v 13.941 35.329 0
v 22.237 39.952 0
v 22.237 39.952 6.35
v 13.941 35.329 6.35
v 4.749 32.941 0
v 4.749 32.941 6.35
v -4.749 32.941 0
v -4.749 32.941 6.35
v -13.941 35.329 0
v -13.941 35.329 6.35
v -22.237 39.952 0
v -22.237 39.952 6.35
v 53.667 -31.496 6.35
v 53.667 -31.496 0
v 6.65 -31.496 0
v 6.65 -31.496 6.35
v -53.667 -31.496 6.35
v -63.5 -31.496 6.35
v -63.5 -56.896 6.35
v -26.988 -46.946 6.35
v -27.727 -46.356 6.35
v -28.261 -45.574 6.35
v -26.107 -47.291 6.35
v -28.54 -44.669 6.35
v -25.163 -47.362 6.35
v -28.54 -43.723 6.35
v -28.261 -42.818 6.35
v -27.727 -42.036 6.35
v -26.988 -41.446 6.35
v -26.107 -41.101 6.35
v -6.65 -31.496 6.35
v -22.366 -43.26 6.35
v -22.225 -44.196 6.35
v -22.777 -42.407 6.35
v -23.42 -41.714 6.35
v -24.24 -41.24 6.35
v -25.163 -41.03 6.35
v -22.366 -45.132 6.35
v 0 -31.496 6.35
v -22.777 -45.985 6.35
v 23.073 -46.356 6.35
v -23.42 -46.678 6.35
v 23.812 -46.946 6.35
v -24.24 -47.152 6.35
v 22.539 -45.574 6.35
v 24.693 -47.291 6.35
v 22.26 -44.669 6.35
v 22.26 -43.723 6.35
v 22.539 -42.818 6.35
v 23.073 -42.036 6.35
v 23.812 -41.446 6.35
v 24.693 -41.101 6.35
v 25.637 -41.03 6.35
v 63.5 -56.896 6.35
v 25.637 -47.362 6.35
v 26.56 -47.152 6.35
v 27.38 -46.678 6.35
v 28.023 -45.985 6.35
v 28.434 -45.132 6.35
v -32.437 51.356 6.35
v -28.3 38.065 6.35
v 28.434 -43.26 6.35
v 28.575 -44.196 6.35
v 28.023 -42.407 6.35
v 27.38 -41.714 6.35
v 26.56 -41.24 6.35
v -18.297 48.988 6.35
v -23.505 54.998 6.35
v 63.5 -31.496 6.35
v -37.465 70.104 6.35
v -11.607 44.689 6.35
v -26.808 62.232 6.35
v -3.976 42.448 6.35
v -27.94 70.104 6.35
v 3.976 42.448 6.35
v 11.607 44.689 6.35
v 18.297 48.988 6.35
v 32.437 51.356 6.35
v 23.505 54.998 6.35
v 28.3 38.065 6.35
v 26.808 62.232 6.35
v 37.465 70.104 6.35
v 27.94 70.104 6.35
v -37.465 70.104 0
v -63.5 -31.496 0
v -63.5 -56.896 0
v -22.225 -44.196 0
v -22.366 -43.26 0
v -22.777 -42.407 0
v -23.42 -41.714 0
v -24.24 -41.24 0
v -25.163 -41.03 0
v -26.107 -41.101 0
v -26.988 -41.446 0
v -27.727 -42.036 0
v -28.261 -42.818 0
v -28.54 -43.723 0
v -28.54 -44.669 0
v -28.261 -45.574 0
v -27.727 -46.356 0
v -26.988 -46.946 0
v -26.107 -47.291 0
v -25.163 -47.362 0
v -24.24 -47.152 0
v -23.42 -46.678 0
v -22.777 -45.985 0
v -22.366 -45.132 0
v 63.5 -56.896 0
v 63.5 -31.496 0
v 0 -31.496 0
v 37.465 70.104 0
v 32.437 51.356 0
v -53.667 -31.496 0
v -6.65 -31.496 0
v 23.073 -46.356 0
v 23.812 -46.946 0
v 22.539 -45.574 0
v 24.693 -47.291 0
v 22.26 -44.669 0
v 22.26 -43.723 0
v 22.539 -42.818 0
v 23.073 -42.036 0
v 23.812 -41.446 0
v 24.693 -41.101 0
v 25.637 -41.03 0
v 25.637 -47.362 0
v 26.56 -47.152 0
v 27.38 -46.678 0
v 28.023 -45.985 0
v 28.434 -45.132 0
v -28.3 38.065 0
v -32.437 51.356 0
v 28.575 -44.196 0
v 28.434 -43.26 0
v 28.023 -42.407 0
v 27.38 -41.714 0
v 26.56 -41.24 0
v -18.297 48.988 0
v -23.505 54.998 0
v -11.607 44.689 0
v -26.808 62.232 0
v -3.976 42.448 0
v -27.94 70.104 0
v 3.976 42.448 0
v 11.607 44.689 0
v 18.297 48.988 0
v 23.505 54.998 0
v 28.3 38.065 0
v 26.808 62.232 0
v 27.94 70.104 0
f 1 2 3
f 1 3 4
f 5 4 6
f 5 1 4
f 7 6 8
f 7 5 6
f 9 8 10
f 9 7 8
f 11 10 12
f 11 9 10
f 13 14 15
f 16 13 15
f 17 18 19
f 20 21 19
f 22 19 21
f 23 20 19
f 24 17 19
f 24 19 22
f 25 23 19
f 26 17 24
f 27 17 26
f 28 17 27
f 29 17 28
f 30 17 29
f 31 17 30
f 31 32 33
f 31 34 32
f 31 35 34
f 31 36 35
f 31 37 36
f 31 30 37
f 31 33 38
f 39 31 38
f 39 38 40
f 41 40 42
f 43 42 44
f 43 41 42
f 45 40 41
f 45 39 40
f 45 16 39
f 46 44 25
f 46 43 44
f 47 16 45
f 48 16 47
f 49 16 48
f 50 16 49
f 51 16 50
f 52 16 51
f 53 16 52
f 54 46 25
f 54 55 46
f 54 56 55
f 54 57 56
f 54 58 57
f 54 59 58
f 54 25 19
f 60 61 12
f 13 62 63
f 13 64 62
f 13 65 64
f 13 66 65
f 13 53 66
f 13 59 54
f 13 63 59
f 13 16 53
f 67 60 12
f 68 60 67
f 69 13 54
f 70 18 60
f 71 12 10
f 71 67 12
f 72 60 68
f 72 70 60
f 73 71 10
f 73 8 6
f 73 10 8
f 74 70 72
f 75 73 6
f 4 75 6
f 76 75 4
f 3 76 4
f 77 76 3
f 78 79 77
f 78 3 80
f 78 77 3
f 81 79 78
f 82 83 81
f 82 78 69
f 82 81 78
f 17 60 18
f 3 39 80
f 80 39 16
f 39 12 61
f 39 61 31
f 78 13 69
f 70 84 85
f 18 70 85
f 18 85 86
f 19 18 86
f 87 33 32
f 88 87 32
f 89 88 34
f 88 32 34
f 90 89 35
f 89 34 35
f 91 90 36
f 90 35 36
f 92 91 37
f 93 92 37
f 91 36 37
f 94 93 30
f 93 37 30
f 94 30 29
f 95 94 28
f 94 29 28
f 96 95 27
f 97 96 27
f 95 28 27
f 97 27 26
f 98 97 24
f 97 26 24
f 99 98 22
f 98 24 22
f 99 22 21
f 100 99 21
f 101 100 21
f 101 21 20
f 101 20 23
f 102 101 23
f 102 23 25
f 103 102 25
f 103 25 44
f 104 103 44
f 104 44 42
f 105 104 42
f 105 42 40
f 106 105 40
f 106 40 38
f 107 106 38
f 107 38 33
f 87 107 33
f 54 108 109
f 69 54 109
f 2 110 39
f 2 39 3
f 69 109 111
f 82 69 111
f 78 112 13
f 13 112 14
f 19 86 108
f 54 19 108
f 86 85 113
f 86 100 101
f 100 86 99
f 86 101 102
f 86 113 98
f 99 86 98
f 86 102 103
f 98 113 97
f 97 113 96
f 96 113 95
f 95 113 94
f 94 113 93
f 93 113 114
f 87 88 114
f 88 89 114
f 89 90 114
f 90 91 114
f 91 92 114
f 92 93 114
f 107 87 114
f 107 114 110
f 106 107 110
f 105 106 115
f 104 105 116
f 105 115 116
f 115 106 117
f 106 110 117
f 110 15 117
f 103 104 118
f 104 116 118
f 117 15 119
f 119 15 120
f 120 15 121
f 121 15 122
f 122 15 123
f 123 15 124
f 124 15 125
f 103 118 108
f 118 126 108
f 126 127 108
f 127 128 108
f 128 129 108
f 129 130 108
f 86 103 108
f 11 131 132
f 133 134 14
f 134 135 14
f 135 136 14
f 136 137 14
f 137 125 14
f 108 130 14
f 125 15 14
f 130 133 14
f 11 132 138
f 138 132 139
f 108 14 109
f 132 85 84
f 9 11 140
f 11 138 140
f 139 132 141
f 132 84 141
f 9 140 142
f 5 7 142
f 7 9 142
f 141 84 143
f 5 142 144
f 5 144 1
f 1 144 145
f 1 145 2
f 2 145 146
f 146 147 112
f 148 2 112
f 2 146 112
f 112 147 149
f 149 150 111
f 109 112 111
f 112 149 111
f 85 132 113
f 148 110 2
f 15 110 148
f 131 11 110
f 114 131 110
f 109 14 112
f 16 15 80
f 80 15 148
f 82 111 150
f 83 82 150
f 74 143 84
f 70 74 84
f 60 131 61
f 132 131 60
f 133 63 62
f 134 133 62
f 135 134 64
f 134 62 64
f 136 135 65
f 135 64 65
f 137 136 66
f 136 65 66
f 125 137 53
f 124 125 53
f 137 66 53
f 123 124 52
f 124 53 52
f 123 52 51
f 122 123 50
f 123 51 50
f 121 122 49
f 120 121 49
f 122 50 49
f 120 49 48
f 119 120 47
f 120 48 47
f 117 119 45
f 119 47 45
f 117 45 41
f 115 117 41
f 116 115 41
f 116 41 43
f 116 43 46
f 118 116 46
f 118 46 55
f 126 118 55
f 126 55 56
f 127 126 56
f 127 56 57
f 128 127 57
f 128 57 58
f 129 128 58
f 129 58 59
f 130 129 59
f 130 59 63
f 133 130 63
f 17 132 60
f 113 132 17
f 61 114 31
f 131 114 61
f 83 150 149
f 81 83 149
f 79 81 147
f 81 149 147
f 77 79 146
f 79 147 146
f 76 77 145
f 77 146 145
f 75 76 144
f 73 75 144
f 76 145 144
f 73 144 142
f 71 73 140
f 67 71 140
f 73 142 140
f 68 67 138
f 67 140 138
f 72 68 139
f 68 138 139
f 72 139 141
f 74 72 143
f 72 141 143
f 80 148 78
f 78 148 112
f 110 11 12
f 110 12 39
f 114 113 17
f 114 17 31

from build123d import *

# Parameters (mm, degrees)
BOSS_EXTRUDE1_DEPTH = 6.35
SKETCH2_R           = 3.175
CUT_EXTRUDE1_DEPTH  = 18.415


with BuildPart() as part:
    # Sketch1 → Boss-Extrude1 (new body)
    with BuildSketch(Plane.XY):
        with BuildLine():
            Line((-27.94, 70.104), (-37.465, 70.104))
            Line((-37.465, 70.104), (-63.5, -31.496))
            Line((-63.5, -31.496), (-63.5, -56.896))
            Line((-63.5, -56.896), (63.5, -56.896))
            Line((63.5, -56.896), (63.5, -31.496))
            Line((63.5, -31.496), (37.465, 70.104))
            Line((37.465, 70.104), (27.94, 70.104))
            ThreePointArc((27.94, 70.104), (0, 42.164), (-27.94, 70.104))
        make_face()
        Polygon((53.667246667, -31.496), (6.6504394, -31.496), (28.29998163, 38.06486673), (32.43650344, 51.355680886), align=None, mode=Mode.SUBTRACT)
        Polygon((-32.43650344, 51.355680886), (-53.667246667, -31.496), (-6.6504394, -31.496), (-28.29998163, 38.06486673), align=None, mode=Mode.SUBTRACT)
        with BuildLine():
            Line((0, -31.496), (22.236848418, 39.951905588))
            ThreePointArc((22.236848418, 39.951905588), (0, 32.639), (-22.236848418, 39.951905588))
            Line((-22.236848418, 39.951905588), (0, -31.496))
        make_face(mode=Mode.SUBTRACT)
    extrude(amount=BOSS_EXTRUDE1_DEPTH)

    # Sketch2 → Cut-Extrude1 (cut)
    with BuildSketch(Plane.XY.offset(6.35)):
        with Locations((-25.4, -44.196)):
            Circle(SKETCH2_R)
        with Locations((25.4, -44.196)):
            Circle(SKETCH2_R)
    extrude(amount=-CUT_EXTRUDE1_DEPTH, mode=Mode.SUBTRACT)


solid = part.part
